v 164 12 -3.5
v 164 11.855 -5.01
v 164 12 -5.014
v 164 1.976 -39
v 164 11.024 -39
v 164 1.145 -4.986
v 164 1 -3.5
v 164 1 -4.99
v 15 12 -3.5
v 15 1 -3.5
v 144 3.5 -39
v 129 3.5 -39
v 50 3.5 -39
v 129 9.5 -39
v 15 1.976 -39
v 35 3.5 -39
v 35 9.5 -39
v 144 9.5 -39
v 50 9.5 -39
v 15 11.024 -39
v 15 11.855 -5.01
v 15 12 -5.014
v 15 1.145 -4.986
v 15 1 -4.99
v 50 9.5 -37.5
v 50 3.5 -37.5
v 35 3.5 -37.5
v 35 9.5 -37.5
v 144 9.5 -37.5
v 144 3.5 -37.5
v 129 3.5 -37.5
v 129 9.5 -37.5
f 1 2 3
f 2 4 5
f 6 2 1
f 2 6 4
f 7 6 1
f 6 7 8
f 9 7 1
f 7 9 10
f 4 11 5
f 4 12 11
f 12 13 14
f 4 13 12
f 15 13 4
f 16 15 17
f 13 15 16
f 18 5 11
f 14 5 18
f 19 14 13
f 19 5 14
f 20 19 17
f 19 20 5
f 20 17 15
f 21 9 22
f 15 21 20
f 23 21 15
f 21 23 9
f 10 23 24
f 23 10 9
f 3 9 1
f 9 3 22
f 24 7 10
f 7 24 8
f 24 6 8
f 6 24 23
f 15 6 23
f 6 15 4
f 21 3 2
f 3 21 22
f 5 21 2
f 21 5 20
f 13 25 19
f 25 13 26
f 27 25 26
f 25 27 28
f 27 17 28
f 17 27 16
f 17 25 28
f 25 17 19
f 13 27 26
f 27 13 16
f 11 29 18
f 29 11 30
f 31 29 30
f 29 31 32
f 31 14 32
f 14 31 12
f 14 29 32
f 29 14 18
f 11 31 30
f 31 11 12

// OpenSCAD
$fn=100;

//translate([0,-50,0]) // pour avoir plus de place pour l'impression
    difference () { // Premier pied
        translate([15,1,-5-34])
            cube([184-20-15,11,34+1.5]); //+1 for insersion

        translate([14,1,-5-35])
            rotate([1.4,0,0]) 
                cube([184-20-15+2,1,35]);
        // Place des tampons sous les pieds
        translate([14,11,-5-35])
            rotate([-1.4,0,0]) 
                cube([184-20-15+2,1,35]);
        translate([15+20,1+5.5-3,-5-34-1])
            cube([15,6,2.5]);
        translate([15+184-20-15-20-15,1+5.5-3,-5-34-1])
            cube([15,6,2.5]);
    };
